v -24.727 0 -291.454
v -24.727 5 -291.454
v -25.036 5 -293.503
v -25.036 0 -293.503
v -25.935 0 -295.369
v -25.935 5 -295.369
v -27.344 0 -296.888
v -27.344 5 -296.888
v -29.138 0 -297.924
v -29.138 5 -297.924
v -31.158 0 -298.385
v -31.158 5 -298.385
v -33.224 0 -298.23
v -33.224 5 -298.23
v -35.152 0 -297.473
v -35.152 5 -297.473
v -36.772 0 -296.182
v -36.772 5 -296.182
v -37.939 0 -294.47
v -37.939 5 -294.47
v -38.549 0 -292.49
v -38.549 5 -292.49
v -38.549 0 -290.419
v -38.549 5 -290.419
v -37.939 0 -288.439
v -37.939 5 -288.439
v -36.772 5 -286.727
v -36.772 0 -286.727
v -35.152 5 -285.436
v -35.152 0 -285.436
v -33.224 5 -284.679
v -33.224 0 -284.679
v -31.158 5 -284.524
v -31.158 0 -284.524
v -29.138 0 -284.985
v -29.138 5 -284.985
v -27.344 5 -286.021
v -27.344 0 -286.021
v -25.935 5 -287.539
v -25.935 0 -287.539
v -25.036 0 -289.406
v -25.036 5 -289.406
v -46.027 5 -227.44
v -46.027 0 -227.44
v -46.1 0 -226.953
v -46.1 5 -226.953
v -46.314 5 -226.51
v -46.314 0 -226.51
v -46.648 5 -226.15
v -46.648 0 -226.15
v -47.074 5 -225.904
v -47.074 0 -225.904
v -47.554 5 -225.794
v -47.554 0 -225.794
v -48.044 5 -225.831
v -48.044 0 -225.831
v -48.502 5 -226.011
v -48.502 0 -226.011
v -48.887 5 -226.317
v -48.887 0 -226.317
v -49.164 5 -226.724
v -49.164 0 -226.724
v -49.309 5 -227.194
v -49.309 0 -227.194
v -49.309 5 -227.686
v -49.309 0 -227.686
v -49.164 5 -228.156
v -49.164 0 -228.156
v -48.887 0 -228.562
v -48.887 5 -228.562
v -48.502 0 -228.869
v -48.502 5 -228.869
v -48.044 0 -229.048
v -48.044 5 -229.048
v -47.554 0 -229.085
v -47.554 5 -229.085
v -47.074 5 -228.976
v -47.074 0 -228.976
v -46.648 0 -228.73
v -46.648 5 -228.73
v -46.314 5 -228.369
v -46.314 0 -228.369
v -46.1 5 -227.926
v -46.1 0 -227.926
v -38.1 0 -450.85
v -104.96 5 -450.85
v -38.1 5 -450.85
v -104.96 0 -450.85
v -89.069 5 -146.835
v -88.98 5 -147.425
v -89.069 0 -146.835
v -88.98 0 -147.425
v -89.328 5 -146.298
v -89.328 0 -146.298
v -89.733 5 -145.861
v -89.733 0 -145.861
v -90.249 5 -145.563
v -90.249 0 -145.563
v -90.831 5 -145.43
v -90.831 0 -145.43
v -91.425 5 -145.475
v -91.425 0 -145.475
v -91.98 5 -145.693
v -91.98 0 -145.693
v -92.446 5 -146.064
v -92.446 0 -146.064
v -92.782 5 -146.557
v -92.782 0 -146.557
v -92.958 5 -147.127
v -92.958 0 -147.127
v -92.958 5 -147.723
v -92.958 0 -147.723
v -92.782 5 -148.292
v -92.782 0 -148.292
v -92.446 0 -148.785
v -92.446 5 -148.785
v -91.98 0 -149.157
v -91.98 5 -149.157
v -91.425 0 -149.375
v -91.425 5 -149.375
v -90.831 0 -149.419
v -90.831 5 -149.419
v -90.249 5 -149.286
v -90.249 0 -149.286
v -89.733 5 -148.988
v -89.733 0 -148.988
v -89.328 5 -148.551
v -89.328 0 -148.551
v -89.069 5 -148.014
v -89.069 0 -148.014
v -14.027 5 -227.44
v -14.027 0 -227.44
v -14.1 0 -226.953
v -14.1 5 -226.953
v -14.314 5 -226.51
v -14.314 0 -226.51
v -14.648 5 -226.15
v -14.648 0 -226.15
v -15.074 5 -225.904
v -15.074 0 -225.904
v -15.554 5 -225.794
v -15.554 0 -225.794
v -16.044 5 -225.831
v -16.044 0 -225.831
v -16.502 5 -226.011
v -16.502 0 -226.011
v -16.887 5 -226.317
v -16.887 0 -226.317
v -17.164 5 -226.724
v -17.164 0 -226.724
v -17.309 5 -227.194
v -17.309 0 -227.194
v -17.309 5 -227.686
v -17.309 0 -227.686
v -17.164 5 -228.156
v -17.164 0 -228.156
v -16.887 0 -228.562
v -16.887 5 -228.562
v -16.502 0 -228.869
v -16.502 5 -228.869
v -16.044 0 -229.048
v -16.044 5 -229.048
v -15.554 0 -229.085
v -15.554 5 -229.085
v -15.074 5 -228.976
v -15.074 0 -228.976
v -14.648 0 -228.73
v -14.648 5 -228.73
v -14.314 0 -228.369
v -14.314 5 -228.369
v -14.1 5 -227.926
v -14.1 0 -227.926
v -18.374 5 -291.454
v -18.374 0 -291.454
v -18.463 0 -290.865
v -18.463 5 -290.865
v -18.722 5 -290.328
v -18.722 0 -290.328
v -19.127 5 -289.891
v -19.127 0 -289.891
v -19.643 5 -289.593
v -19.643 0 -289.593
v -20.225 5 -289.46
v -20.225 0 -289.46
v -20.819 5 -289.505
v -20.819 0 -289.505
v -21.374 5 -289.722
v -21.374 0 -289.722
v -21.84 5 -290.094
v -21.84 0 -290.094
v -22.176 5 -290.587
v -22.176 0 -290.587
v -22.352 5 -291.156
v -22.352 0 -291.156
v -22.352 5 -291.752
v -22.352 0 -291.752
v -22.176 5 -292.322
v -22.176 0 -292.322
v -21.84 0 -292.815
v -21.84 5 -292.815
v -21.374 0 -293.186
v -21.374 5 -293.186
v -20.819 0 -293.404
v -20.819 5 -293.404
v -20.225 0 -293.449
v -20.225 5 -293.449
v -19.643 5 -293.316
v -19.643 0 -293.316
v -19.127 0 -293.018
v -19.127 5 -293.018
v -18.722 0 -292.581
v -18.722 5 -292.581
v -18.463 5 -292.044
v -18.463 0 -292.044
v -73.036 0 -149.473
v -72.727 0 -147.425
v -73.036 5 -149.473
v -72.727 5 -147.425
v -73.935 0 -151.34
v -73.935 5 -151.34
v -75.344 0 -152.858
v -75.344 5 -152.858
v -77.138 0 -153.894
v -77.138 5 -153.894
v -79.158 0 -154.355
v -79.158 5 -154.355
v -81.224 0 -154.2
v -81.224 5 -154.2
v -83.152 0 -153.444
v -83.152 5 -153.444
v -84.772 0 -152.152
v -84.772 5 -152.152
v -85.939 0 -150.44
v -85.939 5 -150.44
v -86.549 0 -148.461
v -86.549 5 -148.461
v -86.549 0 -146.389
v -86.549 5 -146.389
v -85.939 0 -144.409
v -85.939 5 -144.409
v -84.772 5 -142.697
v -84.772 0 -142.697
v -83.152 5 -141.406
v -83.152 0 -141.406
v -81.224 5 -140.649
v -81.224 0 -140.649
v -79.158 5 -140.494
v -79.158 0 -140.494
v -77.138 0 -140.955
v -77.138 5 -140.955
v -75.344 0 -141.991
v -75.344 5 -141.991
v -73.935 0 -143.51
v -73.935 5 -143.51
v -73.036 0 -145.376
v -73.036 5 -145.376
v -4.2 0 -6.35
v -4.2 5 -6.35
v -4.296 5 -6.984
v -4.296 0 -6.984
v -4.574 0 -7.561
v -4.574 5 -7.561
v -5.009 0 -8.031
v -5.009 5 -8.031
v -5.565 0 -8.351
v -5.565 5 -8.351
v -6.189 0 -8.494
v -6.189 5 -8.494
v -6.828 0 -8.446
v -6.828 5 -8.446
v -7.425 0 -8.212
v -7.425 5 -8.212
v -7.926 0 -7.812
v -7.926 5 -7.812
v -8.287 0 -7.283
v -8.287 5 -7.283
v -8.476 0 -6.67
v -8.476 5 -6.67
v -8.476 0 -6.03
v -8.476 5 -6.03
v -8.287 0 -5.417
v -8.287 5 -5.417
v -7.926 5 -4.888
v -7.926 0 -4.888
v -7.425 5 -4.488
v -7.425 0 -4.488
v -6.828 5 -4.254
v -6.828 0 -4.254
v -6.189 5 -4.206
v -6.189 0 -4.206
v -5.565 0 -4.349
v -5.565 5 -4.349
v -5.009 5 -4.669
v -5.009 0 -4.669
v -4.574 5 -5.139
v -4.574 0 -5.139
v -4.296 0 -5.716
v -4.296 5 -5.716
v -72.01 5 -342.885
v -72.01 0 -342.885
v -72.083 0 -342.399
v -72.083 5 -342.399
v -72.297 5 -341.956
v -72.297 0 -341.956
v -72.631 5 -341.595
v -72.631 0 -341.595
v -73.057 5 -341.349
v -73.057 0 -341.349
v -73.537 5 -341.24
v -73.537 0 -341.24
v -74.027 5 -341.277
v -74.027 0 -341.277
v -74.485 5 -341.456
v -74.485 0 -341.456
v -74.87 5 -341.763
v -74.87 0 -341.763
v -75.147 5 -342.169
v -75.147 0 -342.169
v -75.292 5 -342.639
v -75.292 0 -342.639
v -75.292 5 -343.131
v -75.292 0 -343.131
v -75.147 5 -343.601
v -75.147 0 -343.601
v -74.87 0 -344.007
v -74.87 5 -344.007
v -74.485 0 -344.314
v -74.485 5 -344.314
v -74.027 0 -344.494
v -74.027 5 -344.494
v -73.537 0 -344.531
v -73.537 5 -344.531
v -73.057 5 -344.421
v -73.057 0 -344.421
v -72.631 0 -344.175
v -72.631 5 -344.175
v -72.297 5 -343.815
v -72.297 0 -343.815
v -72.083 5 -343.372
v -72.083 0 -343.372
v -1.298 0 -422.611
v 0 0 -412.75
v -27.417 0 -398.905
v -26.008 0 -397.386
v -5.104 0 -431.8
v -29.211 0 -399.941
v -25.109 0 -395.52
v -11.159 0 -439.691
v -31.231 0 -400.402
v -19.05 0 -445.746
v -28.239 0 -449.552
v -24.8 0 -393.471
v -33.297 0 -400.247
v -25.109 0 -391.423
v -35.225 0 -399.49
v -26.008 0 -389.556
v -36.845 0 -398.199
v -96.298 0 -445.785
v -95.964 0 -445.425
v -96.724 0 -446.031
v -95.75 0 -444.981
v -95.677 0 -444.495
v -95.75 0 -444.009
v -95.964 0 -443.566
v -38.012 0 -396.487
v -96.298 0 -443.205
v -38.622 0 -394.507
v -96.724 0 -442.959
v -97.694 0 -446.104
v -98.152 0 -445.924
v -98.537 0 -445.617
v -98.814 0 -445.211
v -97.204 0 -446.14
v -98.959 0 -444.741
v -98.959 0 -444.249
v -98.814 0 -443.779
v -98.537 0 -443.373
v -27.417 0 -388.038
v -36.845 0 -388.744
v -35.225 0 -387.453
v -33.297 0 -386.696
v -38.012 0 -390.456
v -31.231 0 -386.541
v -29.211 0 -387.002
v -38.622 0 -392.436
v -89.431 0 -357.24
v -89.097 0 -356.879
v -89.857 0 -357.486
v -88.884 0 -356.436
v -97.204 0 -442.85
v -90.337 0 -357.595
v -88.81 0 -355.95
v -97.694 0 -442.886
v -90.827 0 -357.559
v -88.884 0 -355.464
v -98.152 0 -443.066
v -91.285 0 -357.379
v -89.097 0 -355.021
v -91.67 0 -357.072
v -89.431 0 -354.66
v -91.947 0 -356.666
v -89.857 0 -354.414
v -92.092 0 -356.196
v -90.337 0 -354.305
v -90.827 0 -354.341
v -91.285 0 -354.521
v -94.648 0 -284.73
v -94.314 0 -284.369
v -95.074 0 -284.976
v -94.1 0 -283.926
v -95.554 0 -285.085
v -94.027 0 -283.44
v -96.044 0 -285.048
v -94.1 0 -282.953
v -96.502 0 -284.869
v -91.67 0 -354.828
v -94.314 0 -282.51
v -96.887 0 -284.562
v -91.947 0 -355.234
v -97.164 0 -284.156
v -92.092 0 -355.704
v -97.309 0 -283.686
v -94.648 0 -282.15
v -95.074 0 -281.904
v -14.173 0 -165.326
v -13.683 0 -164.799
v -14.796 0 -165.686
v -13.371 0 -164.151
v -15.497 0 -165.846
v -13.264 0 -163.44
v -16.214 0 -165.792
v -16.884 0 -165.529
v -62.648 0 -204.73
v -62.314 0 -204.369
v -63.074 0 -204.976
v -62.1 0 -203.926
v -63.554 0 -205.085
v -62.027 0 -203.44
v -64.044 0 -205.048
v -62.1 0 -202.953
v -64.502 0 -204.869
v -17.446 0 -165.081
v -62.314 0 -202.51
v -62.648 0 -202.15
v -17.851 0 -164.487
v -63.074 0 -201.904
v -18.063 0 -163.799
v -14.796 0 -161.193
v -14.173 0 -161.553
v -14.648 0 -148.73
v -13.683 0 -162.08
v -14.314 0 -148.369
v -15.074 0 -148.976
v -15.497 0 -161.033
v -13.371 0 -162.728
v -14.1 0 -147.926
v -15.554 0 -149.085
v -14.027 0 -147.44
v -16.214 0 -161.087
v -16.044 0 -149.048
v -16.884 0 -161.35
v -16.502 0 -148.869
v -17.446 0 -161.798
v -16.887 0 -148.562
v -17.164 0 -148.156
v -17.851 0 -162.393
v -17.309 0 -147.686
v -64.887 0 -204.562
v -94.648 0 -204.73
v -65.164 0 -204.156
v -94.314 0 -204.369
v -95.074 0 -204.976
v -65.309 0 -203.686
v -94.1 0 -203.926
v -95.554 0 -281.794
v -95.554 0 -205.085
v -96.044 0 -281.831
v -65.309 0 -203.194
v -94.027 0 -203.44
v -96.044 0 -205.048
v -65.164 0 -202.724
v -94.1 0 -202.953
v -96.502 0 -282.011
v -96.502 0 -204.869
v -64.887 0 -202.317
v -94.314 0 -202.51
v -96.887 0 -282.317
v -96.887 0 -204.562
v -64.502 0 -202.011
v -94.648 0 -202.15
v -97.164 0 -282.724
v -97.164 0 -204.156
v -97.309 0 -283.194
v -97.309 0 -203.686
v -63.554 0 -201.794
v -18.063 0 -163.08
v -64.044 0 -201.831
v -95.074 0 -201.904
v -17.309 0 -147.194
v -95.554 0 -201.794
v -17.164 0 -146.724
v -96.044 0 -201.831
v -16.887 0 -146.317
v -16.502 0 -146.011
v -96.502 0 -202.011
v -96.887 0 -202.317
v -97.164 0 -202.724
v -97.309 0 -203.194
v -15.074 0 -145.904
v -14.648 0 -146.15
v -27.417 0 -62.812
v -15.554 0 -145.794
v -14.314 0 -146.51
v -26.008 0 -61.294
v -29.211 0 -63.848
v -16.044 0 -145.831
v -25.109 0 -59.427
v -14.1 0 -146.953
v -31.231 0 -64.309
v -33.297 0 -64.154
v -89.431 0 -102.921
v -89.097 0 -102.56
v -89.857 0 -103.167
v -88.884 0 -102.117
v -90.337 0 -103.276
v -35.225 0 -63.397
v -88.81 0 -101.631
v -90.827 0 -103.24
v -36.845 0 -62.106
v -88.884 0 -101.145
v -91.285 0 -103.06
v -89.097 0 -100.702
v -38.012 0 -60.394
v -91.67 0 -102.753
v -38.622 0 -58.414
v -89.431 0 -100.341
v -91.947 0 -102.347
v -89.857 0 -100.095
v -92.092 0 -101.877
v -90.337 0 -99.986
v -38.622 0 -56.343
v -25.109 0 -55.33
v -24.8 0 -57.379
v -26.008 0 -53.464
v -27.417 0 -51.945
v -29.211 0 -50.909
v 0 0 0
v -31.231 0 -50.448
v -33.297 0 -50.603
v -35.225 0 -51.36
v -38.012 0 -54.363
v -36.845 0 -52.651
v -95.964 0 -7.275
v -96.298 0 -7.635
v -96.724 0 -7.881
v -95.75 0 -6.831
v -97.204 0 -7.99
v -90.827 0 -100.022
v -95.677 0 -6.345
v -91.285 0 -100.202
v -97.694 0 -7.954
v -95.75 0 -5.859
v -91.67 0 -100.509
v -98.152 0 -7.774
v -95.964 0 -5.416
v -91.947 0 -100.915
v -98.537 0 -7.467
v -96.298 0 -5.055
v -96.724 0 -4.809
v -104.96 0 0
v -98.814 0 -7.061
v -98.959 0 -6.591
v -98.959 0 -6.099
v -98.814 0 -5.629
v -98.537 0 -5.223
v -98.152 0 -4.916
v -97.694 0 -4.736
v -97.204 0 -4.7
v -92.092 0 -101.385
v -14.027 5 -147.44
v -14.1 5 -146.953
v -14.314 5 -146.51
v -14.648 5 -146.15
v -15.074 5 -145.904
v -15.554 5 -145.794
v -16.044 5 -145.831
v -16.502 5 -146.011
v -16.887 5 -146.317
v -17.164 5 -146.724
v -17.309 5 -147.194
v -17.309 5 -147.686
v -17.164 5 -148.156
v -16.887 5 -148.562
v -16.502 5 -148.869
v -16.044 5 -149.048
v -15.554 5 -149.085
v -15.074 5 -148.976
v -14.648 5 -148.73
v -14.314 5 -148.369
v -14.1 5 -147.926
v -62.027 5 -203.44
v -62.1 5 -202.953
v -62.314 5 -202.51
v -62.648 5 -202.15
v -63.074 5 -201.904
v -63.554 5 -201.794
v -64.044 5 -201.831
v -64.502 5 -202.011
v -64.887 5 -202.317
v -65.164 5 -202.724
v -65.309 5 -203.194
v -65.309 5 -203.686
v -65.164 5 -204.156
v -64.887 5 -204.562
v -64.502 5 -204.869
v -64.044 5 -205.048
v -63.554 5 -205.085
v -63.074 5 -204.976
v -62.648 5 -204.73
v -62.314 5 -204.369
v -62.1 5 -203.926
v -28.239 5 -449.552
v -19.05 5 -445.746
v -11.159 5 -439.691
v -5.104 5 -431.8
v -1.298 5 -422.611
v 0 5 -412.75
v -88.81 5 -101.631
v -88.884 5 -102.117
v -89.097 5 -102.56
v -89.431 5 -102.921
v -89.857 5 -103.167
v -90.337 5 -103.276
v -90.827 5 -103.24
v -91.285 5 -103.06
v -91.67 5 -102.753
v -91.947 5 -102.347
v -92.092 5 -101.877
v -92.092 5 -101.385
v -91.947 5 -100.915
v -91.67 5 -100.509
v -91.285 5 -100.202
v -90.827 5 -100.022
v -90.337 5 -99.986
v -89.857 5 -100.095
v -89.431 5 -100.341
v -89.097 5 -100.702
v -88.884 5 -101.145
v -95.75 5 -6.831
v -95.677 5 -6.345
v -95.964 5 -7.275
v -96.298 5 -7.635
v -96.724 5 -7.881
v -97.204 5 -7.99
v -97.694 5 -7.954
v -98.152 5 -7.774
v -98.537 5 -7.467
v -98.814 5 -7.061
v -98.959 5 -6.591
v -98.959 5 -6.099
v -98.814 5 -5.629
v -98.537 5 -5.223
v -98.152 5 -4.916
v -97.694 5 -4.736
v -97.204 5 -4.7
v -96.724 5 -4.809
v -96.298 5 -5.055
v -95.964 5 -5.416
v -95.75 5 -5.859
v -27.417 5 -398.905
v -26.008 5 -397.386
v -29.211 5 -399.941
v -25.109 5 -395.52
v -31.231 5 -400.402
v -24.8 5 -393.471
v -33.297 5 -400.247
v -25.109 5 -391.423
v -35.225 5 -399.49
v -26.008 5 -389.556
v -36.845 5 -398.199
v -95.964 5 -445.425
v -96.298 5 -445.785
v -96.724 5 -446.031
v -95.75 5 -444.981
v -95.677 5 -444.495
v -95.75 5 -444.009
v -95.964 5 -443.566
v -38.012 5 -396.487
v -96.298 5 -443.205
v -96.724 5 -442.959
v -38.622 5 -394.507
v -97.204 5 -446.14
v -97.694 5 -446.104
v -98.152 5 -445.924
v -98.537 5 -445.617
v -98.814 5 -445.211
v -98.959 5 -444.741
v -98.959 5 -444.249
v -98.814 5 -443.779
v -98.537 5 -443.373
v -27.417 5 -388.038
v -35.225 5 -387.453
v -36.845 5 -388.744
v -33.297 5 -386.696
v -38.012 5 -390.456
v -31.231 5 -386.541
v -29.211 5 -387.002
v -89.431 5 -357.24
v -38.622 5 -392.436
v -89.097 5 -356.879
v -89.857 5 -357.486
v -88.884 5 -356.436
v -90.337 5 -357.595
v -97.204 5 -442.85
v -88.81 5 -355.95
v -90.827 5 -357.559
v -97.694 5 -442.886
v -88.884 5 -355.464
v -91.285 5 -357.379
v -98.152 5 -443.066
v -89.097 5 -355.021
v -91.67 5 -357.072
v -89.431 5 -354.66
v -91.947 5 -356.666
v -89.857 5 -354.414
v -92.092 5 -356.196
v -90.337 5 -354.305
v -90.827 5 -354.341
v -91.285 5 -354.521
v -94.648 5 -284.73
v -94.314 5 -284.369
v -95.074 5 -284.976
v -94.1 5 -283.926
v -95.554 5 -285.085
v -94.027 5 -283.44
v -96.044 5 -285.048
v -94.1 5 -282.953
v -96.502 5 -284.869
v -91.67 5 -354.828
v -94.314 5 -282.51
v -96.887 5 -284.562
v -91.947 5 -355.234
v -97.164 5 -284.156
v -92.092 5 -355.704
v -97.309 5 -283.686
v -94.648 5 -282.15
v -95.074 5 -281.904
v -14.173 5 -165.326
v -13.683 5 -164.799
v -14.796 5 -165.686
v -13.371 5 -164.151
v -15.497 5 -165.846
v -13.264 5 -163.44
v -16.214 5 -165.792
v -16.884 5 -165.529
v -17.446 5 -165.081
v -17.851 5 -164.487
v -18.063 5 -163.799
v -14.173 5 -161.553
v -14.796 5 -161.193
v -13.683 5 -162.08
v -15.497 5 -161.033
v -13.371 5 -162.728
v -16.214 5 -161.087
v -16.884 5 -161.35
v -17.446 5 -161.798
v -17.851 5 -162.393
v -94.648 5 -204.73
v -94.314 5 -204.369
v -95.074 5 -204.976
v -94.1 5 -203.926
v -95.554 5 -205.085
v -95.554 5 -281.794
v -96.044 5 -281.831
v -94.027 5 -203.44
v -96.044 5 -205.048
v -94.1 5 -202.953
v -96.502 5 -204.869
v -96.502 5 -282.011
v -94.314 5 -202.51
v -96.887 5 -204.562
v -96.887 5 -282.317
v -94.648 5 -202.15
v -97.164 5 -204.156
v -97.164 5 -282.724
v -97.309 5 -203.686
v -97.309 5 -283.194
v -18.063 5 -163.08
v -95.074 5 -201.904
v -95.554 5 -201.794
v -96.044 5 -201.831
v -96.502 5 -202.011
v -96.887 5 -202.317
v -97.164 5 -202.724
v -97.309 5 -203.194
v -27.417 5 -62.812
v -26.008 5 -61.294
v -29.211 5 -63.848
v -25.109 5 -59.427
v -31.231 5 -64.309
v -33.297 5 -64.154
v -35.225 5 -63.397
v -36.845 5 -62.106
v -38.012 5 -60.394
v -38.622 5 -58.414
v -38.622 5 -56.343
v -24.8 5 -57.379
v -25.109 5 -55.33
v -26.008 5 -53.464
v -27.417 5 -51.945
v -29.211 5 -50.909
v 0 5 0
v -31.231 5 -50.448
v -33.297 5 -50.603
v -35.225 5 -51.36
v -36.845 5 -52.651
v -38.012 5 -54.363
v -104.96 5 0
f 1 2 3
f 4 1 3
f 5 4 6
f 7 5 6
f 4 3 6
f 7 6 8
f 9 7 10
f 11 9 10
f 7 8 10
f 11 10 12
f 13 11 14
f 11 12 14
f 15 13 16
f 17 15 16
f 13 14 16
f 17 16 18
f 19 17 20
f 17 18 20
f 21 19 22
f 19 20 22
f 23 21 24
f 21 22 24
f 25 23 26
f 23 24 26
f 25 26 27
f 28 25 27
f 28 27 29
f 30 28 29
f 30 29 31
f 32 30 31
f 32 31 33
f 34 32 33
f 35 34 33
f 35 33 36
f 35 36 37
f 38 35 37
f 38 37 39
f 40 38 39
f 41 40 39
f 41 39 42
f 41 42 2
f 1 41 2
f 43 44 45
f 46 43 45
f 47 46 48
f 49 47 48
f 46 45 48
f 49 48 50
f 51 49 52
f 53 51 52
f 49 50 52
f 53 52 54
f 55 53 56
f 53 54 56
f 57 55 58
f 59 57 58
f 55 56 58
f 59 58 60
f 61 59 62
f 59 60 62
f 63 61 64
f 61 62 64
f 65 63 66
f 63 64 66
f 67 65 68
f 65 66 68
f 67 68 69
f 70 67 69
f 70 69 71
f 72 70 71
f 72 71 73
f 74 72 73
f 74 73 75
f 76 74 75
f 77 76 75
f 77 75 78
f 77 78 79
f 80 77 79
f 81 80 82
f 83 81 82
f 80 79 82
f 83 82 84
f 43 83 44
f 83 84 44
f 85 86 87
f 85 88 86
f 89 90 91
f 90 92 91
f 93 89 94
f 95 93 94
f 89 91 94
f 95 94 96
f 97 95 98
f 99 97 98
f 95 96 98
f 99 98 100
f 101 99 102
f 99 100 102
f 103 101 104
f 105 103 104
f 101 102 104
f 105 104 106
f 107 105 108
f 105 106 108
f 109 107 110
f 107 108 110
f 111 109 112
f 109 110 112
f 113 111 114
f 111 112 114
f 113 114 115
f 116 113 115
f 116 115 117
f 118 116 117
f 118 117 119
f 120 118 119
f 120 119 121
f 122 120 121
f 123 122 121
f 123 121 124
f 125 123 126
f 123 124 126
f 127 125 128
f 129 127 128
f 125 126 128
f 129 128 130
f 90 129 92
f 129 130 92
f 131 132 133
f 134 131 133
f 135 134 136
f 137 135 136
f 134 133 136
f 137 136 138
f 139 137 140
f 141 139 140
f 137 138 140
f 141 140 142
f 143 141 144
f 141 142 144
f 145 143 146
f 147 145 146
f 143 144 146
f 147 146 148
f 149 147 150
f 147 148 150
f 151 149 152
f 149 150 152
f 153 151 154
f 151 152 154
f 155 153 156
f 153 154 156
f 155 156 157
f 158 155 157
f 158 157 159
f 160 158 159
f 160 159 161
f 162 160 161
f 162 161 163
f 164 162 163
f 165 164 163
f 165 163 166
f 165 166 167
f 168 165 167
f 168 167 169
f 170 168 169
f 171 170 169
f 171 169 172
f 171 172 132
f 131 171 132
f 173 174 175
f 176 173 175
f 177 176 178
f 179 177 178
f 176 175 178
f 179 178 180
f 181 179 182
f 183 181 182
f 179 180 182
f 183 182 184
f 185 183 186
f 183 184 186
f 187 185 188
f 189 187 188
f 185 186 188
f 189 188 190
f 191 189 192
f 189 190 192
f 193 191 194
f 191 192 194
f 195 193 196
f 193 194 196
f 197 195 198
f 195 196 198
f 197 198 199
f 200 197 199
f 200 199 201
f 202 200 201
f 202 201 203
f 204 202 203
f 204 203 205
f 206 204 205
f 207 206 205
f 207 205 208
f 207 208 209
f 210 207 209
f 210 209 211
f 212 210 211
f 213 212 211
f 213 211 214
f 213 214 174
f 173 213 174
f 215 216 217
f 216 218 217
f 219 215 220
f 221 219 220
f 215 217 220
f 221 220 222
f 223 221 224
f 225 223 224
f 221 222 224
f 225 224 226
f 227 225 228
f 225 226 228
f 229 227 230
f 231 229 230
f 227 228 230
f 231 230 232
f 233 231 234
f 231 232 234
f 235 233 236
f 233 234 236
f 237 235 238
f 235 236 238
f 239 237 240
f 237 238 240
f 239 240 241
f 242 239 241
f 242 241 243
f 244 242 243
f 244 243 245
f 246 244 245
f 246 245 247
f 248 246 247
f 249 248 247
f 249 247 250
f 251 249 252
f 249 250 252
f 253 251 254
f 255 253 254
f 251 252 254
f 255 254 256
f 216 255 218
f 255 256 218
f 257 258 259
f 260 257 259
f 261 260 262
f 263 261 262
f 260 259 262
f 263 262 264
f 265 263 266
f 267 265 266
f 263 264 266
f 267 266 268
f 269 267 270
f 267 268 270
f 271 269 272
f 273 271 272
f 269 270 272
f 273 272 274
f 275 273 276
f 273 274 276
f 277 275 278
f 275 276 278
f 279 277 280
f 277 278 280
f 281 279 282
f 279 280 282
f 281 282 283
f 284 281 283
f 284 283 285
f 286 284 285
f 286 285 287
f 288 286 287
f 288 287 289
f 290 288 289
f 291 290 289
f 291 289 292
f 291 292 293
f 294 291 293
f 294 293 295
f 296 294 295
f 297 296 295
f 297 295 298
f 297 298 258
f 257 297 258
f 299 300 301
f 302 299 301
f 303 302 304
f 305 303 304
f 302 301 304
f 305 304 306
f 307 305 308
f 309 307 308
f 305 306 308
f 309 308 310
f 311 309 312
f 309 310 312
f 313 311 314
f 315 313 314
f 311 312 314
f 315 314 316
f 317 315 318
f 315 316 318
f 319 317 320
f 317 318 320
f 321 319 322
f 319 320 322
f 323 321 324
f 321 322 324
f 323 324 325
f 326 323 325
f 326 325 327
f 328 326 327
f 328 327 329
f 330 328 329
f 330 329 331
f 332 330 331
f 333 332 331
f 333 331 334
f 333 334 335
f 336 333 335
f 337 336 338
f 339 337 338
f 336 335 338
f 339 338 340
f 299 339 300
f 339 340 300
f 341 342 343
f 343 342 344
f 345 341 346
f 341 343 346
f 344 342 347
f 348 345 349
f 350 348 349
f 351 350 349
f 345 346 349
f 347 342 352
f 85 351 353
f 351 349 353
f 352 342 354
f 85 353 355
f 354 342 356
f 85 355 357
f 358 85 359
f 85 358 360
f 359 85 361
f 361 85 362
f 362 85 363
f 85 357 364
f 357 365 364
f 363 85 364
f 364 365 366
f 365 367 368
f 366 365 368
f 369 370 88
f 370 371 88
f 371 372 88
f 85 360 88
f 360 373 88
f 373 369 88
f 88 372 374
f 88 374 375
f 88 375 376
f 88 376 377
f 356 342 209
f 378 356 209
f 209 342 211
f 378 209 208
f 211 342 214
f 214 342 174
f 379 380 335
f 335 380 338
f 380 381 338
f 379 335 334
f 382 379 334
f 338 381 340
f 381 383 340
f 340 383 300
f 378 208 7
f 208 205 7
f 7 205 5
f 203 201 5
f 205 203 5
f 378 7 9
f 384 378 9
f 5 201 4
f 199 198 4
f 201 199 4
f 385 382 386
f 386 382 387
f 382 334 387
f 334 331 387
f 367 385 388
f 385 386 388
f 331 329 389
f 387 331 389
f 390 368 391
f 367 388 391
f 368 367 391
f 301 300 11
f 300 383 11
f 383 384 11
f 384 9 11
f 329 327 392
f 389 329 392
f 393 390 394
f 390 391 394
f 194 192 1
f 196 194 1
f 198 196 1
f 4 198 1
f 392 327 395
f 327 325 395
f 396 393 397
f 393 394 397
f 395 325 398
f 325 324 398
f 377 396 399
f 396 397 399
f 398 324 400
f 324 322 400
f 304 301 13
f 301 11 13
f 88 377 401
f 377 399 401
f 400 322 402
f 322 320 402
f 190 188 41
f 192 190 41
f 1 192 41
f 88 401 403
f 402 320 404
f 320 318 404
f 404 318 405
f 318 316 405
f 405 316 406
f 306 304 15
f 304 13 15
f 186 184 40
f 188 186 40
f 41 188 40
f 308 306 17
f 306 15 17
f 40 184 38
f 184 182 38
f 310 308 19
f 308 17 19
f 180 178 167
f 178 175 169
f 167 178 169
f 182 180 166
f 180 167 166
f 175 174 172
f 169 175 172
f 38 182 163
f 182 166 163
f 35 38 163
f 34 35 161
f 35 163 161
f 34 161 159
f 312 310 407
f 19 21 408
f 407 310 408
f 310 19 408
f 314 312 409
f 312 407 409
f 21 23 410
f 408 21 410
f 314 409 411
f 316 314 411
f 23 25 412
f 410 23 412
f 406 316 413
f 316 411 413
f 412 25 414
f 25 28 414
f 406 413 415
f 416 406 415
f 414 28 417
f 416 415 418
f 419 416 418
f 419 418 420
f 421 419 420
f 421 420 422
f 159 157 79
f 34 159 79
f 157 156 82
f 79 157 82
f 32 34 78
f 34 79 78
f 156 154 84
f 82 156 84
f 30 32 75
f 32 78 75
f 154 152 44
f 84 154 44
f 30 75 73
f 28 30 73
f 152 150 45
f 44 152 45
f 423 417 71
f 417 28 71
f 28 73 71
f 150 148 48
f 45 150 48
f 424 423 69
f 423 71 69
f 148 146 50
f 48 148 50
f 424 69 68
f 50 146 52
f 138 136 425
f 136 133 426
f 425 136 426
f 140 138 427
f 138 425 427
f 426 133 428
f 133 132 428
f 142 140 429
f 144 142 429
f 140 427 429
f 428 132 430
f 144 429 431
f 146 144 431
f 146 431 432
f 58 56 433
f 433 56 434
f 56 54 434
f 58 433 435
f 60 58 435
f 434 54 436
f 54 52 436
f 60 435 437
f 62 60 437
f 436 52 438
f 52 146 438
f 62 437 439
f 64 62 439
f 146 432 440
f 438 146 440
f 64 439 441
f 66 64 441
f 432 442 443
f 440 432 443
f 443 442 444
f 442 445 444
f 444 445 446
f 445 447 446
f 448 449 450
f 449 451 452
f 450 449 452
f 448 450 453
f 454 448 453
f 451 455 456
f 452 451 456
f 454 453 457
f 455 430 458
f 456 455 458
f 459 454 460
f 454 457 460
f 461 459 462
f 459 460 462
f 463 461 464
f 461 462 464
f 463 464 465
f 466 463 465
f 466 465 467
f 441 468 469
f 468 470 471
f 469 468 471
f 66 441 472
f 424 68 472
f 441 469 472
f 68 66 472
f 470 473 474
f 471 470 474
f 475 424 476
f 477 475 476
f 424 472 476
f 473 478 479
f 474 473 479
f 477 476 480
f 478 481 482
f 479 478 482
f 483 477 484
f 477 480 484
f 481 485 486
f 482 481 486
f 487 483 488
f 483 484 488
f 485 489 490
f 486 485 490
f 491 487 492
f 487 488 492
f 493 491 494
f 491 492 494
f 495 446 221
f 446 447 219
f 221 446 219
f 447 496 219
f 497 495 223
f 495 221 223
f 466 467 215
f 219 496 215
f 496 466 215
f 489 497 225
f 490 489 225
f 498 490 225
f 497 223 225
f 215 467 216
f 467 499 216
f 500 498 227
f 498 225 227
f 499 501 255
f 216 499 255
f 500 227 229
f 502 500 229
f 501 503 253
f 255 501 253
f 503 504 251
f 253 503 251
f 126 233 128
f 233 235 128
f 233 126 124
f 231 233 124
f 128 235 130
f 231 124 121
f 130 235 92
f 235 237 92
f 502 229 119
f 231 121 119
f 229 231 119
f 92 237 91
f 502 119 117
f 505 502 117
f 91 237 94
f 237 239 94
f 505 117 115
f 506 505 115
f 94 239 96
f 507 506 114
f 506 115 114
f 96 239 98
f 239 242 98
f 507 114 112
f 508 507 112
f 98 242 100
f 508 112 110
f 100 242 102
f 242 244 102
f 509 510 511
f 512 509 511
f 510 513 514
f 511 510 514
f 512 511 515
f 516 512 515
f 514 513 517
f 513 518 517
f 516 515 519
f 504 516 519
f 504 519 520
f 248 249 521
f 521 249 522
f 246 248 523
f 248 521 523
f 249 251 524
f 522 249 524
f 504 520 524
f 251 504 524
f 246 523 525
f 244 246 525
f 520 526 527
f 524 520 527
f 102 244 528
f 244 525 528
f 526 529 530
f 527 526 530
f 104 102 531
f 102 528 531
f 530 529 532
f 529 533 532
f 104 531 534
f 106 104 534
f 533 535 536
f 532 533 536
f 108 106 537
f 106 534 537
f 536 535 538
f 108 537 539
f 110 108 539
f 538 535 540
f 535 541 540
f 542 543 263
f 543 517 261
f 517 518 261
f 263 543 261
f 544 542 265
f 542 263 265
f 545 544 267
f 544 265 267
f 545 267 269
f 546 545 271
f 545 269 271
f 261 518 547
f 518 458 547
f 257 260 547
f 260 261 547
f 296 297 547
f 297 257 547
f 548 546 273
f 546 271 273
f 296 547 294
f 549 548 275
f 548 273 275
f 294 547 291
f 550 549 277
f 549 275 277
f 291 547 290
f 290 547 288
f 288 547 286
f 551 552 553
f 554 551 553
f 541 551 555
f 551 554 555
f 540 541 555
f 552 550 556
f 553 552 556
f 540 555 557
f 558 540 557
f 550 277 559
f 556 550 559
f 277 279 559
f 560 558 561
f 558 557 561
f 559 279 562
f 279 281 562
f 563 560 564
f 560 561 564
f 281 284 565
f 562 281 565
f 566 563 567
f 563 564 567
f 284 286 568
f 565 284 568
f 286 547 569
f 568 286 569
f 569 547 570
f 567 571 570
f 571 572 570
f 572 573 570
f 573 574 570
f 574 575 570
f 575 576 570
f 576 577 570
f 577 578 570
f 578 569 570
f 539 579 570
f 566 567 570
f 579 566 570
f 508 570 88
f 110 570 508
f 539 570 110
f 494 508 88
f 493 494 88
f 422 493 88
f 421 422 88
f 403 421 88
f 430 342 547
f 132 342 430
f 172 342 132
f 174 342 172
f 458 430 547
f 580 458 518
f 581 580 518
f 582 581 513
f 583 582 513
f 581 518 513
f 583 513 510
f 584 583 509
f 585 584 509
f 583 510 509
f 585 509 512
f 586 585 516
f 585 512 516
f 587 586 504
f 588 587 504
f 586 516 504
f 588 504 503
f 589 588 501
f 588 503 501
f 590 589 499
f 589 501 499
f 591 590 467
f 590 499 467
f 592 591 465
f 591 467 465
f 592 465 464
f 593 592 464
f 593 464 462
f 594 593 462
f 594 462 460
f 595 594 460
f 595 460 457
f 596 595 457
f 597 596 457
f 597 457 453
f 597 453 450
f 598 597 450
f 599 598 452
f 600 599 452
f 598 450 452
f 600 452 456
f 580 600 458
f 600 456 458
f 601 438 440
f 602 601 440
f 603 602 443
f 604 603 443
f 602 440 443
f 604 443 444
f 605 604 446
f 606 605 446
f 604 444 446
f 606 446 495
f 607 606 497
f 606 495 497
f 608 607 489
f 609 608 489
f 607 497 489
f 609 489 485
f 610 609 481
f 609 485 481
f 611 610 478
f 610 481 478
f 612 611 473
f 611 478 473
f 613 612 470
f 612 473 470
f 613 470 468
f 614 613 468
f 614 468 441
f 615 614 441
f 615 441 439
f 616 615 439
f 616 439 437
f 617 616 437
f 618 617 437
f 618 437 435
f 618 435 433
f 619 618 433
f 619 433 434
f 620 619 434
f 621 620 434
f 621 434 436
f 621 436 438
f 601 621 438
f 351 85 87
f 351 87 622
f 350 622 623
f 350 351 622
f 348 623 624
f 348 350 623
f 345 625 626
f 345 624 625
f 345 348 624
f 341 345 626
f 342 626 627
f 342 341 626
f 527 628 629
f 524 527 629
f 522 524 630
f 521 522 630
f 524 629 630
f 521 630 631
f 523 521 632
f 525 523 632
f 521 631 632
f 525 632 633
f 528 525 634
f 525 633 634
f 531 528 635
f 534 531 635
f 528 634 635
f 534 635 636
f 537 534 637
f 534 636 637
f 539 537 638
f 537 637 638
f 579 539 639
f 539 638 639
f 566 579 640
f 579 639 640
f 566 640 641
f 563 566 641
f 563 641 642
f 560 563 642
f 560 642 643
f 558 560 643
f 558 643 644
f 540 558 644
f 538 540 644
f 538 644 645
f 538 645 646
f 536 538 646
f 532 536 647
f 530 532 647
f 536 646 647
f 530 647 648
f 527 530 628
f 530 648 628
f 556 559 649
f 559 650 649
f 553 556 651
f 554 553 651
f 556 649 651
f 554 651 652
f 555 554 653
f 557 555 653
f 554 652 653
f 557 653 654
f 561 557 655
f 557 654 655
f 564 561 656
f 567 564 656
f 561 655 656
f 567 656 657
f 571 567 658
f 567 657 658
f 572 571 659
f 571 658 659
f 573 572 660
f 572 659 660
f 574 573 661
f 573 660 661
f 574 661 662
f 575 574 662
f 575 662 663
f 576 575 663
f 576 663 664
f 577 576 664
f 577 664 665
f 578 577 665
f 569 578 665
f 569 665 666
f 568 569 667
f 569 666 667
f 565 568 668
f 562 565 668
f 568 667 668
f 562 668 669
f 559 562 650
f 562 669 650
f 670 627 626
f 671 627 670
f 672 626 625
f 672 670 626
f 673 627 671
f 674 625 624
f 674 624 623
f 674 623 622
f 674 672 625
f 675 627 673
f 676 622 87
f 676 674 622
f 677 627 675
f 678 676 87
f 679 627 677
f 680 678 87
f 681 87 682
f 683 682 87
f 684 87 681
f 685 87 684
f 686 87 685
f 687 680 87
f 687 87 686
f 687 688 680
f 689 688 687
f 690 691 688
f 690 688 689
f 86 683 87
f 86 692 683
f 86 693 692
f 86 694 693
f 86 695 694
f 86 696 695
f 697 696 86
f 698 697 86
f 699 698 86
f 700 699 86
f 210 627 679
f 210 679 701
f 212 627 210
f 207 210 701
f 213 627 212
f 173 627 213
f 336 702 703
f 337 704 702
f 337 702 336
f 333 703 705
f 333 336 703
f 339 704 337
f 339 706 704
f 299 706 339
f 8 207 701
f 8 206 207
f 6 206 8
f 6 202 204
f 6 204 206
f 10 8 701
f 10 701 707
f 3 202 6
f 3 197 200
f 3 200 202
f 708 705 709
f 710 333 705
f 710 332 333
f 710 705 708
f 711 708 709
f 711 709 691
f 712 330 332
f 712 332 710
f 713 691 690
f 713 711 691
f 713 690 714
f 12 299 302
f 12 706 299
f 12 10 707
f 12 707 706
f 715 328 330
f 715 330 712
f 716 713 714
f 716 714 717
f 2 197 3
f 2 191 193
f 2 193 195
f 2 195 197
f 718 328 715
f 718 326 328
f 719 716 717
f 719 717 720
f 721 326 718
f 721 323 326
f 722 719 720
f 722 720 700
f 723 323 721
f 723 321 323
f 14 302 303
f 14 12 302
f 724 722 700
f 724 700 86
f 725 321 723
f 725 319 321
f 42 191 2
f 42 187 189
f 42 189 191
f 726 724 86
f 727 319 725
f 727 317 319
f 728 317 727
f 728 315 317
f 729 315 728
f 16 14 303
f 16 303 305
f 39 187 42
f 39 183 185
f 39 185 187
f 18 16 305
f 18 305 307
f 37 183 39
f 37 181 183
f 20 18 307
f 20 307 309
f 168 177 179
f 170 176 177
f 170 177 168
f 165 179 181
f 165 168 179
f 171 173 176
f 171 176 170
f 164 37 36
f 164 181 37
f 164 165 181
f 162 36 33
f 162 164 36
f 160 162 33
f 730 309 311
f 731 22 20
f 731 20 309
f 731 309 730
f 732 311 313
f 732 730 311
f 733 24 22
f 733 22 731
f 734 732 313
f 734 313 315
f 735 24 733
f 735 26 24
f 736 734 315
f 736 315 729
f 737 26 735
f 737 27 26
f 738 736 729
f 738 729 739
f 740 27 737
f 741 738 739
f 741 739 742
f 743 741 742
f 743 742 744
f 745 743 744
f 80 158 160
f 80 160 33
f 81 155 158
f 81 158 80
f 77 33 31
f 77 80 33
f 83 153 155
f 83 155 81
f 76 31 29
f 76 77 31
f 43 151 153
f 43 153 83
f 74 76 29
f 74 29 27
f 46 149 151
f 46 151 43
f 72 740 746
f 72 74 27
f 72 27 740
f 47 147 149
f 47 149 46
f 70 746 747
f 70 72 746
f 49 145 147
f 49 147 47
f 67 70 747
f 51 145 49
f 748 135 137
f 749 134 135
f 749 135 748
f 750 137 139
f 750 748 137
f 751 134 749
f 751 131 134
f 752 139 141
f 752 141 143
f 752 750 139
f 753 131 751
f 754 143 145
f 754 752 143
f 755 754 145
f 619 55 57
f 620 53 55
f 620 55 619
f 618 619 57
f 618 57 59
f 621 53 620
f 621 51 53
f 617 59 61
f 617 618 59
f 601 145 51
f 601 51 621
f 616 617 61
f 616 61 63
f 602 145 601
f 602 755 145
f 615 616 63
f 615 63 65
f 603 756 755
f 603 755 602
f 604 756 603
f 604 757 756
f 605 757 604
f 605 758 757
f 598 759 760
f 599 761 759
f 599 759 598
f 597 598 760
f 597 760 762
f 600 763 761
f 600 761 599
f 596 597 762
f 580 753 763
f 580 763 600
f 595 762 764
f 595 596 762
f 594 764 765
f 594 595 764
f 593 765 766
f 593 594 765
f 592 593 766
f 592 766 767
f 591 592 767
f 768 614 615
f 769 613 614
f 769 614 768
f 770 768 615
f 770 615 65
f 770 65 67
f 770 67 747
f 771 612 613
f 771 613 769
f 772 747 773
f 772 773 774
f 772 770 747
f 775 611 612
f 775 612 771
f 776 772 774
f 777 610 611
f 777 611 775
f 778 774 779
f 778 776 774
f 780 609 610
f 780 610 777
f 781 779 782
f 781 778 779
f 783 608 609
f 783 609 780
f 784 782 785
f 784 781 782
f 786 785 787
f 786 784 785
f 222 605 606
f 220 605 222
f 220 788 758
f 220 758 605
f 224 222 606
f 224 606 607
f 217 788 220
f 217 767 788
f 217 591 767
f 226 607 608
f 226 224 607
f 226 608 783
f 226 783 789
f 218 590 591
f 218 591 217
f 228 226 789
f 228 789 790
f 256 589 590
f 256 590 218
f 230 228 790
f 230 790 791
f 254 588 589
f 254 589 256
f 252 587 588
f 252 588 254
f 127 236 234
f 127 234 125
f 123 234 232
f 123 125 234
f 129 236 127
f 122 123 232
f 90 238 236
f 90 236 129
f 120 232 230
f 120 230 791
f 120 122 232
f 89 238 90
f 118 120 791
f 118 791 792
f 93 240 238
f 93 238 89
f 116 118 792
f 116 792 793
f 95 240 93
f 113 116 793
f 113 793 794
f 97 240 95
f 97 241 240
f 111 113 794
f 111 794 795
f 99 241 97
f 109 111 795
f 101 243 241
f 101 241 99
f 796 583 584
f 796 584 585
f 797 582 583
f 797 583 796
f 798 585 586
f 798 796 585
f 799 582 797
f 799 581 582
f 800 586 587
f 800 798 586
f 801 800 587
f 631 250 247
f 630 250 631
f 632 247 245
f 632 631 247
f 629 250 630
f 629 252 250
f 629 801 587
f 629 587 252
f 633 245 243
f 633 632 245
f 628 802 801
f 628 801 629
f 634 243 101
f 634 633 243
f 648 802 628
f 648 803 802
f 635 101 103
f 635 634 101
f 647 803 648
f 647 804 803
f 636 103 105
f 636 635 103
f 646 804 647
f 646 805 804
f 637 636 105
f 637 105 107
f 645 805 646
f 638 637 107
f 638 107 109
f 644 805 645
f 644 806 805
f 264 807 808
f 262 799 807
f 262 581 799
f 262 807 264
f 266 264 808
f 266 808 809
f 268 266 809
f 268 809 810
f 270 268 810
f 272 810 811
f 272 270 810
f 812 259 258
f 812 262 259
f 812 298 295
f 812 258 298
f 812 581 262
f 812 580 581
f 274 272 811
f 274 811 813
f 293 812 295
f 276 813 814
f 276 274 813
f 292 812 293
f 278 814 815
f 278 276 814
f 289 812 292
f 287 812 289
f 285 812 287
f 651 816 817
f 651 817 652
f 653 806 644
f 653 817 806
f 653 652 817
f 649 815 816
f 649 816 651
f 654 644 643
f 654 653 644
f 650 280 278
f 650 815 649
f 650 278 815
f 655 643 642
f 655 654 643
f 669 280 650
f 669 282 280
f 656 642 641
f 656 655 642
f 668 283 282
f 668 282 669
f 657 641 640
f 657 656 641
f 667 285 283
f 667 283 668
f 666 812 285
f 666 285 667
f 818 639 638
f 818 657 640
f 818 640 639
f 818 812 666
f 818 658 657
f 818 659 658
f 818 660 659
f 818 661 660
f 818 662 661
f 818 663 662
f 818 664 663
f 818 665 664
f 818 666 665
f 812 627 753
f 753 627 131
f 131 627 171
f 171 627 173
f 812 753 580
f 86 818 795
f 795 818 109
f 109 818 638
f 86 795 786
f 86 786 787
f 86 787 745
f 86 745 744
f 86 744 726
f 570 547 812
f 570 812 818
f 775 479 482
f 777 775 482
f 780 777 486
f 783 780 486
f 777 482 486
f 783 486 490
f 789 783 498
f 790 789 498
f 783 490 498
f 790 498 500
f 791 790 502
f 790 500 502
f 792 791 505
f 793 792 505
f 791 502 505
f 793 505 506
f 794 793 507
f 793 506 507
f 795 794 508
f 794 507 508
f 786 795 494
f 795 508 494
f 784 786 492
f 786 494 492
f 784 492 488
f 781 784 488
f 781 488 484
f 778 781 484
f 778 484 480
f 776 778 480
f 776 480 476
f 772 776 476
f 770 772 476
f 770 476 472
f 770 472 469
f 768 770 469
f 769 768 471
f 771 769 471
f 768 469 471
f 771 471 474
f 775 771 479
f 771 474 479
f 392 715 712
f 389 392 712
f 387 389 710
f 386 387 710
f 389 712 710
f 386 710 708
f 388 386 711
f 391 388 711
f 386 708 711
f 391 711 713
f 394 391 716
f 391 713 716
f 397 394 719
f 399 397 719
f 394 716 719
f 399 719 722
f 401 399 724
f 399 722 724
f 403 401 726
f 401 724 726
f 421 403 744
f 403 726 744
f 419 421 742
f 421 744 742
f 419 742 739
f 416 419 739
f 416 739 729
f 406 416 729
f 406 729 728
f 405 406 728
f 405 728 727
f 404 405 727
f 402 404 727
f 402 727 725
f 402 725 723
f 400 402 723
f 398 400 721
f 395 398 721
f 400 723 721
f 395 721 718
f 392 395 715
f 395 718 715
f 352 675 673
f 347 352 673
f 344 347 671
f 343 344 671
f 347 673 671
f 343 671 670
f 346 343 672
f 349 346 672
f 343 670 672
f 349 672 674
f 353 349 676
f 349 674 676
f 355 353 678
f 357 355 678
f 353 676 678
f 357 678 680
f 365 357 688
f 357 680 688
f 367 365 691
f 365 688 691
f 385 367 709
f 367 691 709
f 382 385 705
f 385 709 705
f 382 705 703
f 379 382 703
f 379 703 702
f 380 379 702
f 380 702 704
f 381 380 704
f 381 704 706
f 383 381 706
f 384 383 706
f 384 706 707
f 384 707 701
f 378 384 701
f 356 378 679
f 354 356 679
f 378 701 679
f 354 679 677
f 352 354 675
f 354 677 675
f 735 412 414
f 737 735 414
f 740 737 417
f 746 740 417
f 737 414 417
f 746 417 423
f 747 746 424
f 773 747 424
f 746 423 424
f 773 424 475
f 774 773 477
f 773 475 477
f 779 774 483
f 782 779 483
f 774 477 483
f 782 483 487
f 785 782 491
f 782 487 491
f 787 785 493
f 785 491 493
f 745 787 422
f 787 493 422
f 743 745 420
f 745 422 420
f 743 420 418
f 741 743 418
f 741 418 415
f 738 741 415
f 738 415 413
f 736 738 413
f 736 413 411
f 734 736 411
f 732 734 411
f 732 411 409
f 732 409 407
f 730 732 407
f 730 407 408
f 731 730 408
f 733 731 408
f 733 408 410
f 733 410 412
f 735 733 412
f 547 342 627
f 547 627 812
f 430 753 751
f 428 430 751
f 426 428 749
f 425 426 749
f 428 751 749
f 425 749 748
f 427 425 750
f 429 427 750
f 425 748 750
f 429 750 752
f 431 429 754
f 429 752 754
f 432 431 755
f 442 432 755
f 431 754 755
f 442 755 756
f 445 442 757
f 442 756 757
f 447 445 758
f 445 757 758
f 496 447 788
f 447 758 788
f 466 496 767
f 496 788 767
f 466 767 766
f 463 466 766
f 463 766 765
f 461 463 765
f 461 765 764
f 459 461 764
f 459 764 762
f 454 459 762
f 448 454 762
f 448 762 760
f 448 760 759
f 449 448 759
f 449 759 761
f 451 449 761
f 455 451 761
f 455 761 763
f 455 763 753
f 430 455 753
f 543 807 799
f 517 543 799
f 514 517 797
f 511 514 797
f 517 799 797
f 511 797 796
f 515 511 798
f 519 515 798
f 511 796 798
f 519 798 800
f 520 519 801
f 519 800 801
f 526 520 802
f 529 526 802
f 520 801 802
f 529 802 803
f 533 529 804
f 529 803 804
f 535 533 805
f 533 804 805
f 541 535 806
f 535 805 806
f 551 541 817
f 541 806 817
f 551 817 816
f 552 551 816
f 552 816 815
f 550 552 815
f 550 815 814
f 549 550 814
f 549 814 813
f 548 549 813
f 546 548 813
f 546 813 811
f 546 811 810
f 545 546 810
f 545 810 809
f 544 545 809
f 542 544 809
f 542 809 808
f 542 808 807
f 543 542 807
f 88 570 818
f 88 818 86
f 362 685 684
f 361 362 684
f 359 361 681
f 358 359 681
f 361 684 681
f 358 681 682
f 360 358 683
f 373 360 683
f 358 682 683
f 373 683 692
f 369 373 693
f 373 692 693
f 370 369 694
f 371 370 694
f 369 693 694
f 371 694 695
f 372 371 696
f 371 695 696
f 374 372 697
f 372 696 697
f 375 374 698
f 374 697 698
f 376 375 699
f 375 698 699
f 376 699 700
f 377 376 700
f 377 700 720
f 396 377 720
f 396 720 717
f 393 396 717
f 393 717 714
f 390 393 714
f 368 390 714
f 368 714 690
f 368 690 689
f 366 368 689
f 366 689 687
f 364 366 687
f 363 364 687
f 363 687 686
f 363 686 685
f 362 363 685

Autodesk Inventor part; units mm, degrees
ref_plane "YZ Plane" through (0, 0, 0) normal (1, 0, 0) x (0, 1, 0)
ref_plane "XZ Plane" through (0, 0, 0) normal (0, 1, 0) x (-1, 0, 0)
ref_plane "XY Plane" through (0, 0, 0) normal (0, 0, 1) x (1, 0, 0)
sketch "Sketch1" plane through (0, 0, 0) normal (0, 1, 0) x (-1, 0, 0)
  line L0 (0, 0) -> (104.9602, 0)
  line L1 (104.9602, 0) -> (104.9602, -450.85)
  line L2 (104.9602, -450.85) -> (38.1, -450.85)
  line L3 (0, -412.75) -> (0, 0)
  arc A0 (0, -412.75) -> (38.1, -450.85) centre (38.1, -412.75) ccw
  line L4 (38.1, -412.75) -> (38.1, -450.85) construction
  line L5 (38.1, -412.75) -> (76.2, -412.75) construction
  dimension "d1" = 450.85
  dimension "d5" = 38.1
  dimension "d6" = 90
  dimension "d7" = 104.9602
  dimension "d8" = 38.1
extrude "Extrusion1" add sketch "Sketch1" along normal blind 5
sketch "Sketch2" plane through (0, 5, 0) normal (0, 1, 0) x (1, 0, 0)
  circle A0 centre (-31.75, 57.3786) radius 6.95
  line L0 (-104.9602, 0) -> (0, 0) projected
  line L1 (0, 0) -> (0, 412.75) projected
  circle A1 centre (-31.75, 393.4714) radius 6.95
  circle A2 centre (-6.35, 6.35) radius 2.15
  dimension "BearingHole" = 13.9
  dimension "d12" = 57.3786
  dimension "d13" = 31.75
  dimension "d14" = 13.9
  dimension "d15" = 31.75
  dimension "d16" = 336.0928
  dimension "M4Clearance" = 4.3
  dimension "d71" = 6.35
  dimension "d72" = 6.35
extrude "Extrusion2" cut sketch "Sketch2" against normal through all
sketch "Sketch3" plane through (0, 5, 0) normal (0, 1, 0) x (1, 0, 0)
  circle A0 centre (-97.3271, 444.4951) radius 1.7 construction
  circle A1 centre (-97.3271, 6.3451) radius 1.7 construction
  circle A2 centre (-63.6771, 179.4396) radius 3.15 construction
  circle A3 centre (-95.6771, 179.4396) radius 3.5 construction
  circle A4 centre (-79.6771, 147.4247) radius 7 construction
  circle A5 centre (-31.6771, 291.4544) radius 7 construction
  circle A6 centre (-15.6771, 259.4396) radius 3.5 construction
  circle A7 centre (-47.6771, 259.4396) radius 3.5 construction
  circle A8 centre (-31.75, 393.4714) radius 6.95 construction
  circle A9 centre (-15.6771, 163.4396) radius 2.25 construction
  arc A10 (-33.6771, 302.7533) -> (-29.6771, 302.7533) centre (-31.6771, 302.7533) ccw construction
  arc A11 (-29.6771, 304.1259) -> (-33.6771, 304.1259) centre (-31.6771, 304.1259) ccw construction
  line L0 (-29.6771, 302.7533) -> (-29.6771, 304.1259) construction
  line L1 (-33.6771, 304.1259) -> (-33.6771, 302.7533) construction
  line L2 (-77.6771, 158.7533) -> (-77.6771, 160.1259) construction
  arc A12 (-77.6771, 160.1259) -> (-81.6771, 160.1259) centre (-79.6771, 160.1259) ccw construction
  line L3 (-81.6771, 160.1259) -> (-81.6771, 158.7533) construction
  arc A13 (-81.6771, 158.7533) -> (-77.6771, 158.7533) centre (-79.6771, 158.7533) ccw construction
  circle A14 centre (-97.3271, 6.3451) radius 1.65
  circle A15 centre (-97.3271, 444.4951) radius 1.65
  circle A16 centre (-79.6771, 147.4247) radius 6.95
  circle A17 centre (-31.6771, 291.4544) radius 6.95
  circle A18 centre (-15.6771, 163.4396) radius 2.413
  arc A19 (-77.6771, 136.1259) -> (-81.6771, 136.1259) centre (-79.6771, 136.1259) ccw construction
  line L4 (-77.6771, 134.7533) -> (-77.6771, 136.1259) construction
  line L5 (-81.6771, 136.1259) -> (-81.6771, 134.7533) construction
  arc A20 (-81.6771, 134.7533) -> (-77.6771, 134.7533) centre (-79.6771, 134.7533) ccw construction
  circle A21 centre (-90.4602, 355.95) radius 1.7 construction
  circle A22 centre (-90.4602, 355.95) radius 1.65
  circle A23 centre (-90.4602, 101.631) radius 1.7 construction
  circle A24 centre (-90.4602, 101.631) radius 1.65
  point P0 (0, 0)
  dimension "d75" = 3.3
  dimension "d76" = 3.3
  dimension "BearingClearance" = 13.9
  dimension "d78" = 13.9
  dimension "d83" = 4.826
  dimension "d90" = 3.3
  dimension "d91" = 3.3
extrude "Extrusion3" cut sketch "Sketch3" against normal through all
sketch "Sketch4" plane through (0, 0, 0) normal (0, -1, 0) x (1, 0, 0)
  circle A0 centre (-73.66, -342.8852) radius 1.7 construction
  circle A1 centre (-95.6771, -203.4396) radius 1.9304 construction
  circle A2 centre (-47.6771, -227.4396) radius 1.9304 construction
  circle A3 centre (-15.6771, -227.4396) radius 1.9304 construction
  circle A4 centre (-54.3045, -291.4544) radius 2 construction
  circle A5 centre (-95.6771, -283.4396) radius 1.9304 construction
  circle A6 centre (-63.6771, -203.4396) radius 1.9304 construction
  circle A7 centre (-63.6771, -203.4396) radius 1.9304 construction
  circle A8 centre (-15.6771, -147.4396) radius 1.9304 construction
  circle A9 centre (-73.66, -342.8852) radius 1.65
  circle A10 centre (-95.6771, -283.4396) radius 1.65
  circle A11 centre (-47.6771, -227.4396) radius 1.65
  circle A12 centre (-15.6771, -227.4396) radius 1.65
  circle A13 centre (-95.6771, -203.4396) radius 1.65
  circle A14 centre (-63.6771, -203.4396) radius 1.65
  circle A15 centre (-15.6771, -147.4396) radius 1.65
  point P0 (0, 0)
  dimension "d92" = 3.3
  dimension "d93" = 3.3
  dimension "d94" = 3.3
  dimension "d95" = 3.3
  dimension "d96" = 3.3
  dimension "d97" = 3.3
  dimension "d98" = 3.3
extrude "Extrusion4" cut sketch "Sketch4" against normal through all
sketch "Sketch5" plane through (0, 0, 0) normal (0, -1, 0) x (1, 0, 0)
  circle A0 centre (-90.9801, -147.4247) radius 2
  circle A1 centre (-79.6771, -147.4247) radius 6.95 projected
  circle A2 centre (-20.3741, -291.4544) radius 2
  circle A3 centre (-31.6771, -291.4544) radius 6.95 projected
  point P0 (0, 0)
  dimension "d101" = 4
  dimension "d102" = 11.303
  dimension "d103" = 4
  dimension "d104" = 11.303
extrude "Extrusion5" cut sketch "Sketch5" against normal through all contours A0 | A2
equation "\"d14\" = BearingHole"
equation "\"d15\" = d13"
equation "\"d75\" = M3Clearance"
equation "\"d76\" = M3Clearance"
equation "\"BearingClearance\" = BearingHole"
equation "\"d78\" = BearingHole"
equation "\"d90\" = M3Clearance"
equation "\"d91\" = M3Clearance"
equation "\"d92\" = M3Clearance"
equation "\"d93\" = M3Clearance"
equation "\"d94\" = M3Clearance"
equation "\"d95\" = M3Clearance"
equation "\"d96\" = M3Clearance"
equation "\"d97\" = M3Clearance"
equation "\"d98\" = M3Clearance"
equation "\"d103\" = d101"
equation "\"d104\" = d102"
equation "\"M3Clearance\" = 3.3"
properties part number "sidewall outside"
